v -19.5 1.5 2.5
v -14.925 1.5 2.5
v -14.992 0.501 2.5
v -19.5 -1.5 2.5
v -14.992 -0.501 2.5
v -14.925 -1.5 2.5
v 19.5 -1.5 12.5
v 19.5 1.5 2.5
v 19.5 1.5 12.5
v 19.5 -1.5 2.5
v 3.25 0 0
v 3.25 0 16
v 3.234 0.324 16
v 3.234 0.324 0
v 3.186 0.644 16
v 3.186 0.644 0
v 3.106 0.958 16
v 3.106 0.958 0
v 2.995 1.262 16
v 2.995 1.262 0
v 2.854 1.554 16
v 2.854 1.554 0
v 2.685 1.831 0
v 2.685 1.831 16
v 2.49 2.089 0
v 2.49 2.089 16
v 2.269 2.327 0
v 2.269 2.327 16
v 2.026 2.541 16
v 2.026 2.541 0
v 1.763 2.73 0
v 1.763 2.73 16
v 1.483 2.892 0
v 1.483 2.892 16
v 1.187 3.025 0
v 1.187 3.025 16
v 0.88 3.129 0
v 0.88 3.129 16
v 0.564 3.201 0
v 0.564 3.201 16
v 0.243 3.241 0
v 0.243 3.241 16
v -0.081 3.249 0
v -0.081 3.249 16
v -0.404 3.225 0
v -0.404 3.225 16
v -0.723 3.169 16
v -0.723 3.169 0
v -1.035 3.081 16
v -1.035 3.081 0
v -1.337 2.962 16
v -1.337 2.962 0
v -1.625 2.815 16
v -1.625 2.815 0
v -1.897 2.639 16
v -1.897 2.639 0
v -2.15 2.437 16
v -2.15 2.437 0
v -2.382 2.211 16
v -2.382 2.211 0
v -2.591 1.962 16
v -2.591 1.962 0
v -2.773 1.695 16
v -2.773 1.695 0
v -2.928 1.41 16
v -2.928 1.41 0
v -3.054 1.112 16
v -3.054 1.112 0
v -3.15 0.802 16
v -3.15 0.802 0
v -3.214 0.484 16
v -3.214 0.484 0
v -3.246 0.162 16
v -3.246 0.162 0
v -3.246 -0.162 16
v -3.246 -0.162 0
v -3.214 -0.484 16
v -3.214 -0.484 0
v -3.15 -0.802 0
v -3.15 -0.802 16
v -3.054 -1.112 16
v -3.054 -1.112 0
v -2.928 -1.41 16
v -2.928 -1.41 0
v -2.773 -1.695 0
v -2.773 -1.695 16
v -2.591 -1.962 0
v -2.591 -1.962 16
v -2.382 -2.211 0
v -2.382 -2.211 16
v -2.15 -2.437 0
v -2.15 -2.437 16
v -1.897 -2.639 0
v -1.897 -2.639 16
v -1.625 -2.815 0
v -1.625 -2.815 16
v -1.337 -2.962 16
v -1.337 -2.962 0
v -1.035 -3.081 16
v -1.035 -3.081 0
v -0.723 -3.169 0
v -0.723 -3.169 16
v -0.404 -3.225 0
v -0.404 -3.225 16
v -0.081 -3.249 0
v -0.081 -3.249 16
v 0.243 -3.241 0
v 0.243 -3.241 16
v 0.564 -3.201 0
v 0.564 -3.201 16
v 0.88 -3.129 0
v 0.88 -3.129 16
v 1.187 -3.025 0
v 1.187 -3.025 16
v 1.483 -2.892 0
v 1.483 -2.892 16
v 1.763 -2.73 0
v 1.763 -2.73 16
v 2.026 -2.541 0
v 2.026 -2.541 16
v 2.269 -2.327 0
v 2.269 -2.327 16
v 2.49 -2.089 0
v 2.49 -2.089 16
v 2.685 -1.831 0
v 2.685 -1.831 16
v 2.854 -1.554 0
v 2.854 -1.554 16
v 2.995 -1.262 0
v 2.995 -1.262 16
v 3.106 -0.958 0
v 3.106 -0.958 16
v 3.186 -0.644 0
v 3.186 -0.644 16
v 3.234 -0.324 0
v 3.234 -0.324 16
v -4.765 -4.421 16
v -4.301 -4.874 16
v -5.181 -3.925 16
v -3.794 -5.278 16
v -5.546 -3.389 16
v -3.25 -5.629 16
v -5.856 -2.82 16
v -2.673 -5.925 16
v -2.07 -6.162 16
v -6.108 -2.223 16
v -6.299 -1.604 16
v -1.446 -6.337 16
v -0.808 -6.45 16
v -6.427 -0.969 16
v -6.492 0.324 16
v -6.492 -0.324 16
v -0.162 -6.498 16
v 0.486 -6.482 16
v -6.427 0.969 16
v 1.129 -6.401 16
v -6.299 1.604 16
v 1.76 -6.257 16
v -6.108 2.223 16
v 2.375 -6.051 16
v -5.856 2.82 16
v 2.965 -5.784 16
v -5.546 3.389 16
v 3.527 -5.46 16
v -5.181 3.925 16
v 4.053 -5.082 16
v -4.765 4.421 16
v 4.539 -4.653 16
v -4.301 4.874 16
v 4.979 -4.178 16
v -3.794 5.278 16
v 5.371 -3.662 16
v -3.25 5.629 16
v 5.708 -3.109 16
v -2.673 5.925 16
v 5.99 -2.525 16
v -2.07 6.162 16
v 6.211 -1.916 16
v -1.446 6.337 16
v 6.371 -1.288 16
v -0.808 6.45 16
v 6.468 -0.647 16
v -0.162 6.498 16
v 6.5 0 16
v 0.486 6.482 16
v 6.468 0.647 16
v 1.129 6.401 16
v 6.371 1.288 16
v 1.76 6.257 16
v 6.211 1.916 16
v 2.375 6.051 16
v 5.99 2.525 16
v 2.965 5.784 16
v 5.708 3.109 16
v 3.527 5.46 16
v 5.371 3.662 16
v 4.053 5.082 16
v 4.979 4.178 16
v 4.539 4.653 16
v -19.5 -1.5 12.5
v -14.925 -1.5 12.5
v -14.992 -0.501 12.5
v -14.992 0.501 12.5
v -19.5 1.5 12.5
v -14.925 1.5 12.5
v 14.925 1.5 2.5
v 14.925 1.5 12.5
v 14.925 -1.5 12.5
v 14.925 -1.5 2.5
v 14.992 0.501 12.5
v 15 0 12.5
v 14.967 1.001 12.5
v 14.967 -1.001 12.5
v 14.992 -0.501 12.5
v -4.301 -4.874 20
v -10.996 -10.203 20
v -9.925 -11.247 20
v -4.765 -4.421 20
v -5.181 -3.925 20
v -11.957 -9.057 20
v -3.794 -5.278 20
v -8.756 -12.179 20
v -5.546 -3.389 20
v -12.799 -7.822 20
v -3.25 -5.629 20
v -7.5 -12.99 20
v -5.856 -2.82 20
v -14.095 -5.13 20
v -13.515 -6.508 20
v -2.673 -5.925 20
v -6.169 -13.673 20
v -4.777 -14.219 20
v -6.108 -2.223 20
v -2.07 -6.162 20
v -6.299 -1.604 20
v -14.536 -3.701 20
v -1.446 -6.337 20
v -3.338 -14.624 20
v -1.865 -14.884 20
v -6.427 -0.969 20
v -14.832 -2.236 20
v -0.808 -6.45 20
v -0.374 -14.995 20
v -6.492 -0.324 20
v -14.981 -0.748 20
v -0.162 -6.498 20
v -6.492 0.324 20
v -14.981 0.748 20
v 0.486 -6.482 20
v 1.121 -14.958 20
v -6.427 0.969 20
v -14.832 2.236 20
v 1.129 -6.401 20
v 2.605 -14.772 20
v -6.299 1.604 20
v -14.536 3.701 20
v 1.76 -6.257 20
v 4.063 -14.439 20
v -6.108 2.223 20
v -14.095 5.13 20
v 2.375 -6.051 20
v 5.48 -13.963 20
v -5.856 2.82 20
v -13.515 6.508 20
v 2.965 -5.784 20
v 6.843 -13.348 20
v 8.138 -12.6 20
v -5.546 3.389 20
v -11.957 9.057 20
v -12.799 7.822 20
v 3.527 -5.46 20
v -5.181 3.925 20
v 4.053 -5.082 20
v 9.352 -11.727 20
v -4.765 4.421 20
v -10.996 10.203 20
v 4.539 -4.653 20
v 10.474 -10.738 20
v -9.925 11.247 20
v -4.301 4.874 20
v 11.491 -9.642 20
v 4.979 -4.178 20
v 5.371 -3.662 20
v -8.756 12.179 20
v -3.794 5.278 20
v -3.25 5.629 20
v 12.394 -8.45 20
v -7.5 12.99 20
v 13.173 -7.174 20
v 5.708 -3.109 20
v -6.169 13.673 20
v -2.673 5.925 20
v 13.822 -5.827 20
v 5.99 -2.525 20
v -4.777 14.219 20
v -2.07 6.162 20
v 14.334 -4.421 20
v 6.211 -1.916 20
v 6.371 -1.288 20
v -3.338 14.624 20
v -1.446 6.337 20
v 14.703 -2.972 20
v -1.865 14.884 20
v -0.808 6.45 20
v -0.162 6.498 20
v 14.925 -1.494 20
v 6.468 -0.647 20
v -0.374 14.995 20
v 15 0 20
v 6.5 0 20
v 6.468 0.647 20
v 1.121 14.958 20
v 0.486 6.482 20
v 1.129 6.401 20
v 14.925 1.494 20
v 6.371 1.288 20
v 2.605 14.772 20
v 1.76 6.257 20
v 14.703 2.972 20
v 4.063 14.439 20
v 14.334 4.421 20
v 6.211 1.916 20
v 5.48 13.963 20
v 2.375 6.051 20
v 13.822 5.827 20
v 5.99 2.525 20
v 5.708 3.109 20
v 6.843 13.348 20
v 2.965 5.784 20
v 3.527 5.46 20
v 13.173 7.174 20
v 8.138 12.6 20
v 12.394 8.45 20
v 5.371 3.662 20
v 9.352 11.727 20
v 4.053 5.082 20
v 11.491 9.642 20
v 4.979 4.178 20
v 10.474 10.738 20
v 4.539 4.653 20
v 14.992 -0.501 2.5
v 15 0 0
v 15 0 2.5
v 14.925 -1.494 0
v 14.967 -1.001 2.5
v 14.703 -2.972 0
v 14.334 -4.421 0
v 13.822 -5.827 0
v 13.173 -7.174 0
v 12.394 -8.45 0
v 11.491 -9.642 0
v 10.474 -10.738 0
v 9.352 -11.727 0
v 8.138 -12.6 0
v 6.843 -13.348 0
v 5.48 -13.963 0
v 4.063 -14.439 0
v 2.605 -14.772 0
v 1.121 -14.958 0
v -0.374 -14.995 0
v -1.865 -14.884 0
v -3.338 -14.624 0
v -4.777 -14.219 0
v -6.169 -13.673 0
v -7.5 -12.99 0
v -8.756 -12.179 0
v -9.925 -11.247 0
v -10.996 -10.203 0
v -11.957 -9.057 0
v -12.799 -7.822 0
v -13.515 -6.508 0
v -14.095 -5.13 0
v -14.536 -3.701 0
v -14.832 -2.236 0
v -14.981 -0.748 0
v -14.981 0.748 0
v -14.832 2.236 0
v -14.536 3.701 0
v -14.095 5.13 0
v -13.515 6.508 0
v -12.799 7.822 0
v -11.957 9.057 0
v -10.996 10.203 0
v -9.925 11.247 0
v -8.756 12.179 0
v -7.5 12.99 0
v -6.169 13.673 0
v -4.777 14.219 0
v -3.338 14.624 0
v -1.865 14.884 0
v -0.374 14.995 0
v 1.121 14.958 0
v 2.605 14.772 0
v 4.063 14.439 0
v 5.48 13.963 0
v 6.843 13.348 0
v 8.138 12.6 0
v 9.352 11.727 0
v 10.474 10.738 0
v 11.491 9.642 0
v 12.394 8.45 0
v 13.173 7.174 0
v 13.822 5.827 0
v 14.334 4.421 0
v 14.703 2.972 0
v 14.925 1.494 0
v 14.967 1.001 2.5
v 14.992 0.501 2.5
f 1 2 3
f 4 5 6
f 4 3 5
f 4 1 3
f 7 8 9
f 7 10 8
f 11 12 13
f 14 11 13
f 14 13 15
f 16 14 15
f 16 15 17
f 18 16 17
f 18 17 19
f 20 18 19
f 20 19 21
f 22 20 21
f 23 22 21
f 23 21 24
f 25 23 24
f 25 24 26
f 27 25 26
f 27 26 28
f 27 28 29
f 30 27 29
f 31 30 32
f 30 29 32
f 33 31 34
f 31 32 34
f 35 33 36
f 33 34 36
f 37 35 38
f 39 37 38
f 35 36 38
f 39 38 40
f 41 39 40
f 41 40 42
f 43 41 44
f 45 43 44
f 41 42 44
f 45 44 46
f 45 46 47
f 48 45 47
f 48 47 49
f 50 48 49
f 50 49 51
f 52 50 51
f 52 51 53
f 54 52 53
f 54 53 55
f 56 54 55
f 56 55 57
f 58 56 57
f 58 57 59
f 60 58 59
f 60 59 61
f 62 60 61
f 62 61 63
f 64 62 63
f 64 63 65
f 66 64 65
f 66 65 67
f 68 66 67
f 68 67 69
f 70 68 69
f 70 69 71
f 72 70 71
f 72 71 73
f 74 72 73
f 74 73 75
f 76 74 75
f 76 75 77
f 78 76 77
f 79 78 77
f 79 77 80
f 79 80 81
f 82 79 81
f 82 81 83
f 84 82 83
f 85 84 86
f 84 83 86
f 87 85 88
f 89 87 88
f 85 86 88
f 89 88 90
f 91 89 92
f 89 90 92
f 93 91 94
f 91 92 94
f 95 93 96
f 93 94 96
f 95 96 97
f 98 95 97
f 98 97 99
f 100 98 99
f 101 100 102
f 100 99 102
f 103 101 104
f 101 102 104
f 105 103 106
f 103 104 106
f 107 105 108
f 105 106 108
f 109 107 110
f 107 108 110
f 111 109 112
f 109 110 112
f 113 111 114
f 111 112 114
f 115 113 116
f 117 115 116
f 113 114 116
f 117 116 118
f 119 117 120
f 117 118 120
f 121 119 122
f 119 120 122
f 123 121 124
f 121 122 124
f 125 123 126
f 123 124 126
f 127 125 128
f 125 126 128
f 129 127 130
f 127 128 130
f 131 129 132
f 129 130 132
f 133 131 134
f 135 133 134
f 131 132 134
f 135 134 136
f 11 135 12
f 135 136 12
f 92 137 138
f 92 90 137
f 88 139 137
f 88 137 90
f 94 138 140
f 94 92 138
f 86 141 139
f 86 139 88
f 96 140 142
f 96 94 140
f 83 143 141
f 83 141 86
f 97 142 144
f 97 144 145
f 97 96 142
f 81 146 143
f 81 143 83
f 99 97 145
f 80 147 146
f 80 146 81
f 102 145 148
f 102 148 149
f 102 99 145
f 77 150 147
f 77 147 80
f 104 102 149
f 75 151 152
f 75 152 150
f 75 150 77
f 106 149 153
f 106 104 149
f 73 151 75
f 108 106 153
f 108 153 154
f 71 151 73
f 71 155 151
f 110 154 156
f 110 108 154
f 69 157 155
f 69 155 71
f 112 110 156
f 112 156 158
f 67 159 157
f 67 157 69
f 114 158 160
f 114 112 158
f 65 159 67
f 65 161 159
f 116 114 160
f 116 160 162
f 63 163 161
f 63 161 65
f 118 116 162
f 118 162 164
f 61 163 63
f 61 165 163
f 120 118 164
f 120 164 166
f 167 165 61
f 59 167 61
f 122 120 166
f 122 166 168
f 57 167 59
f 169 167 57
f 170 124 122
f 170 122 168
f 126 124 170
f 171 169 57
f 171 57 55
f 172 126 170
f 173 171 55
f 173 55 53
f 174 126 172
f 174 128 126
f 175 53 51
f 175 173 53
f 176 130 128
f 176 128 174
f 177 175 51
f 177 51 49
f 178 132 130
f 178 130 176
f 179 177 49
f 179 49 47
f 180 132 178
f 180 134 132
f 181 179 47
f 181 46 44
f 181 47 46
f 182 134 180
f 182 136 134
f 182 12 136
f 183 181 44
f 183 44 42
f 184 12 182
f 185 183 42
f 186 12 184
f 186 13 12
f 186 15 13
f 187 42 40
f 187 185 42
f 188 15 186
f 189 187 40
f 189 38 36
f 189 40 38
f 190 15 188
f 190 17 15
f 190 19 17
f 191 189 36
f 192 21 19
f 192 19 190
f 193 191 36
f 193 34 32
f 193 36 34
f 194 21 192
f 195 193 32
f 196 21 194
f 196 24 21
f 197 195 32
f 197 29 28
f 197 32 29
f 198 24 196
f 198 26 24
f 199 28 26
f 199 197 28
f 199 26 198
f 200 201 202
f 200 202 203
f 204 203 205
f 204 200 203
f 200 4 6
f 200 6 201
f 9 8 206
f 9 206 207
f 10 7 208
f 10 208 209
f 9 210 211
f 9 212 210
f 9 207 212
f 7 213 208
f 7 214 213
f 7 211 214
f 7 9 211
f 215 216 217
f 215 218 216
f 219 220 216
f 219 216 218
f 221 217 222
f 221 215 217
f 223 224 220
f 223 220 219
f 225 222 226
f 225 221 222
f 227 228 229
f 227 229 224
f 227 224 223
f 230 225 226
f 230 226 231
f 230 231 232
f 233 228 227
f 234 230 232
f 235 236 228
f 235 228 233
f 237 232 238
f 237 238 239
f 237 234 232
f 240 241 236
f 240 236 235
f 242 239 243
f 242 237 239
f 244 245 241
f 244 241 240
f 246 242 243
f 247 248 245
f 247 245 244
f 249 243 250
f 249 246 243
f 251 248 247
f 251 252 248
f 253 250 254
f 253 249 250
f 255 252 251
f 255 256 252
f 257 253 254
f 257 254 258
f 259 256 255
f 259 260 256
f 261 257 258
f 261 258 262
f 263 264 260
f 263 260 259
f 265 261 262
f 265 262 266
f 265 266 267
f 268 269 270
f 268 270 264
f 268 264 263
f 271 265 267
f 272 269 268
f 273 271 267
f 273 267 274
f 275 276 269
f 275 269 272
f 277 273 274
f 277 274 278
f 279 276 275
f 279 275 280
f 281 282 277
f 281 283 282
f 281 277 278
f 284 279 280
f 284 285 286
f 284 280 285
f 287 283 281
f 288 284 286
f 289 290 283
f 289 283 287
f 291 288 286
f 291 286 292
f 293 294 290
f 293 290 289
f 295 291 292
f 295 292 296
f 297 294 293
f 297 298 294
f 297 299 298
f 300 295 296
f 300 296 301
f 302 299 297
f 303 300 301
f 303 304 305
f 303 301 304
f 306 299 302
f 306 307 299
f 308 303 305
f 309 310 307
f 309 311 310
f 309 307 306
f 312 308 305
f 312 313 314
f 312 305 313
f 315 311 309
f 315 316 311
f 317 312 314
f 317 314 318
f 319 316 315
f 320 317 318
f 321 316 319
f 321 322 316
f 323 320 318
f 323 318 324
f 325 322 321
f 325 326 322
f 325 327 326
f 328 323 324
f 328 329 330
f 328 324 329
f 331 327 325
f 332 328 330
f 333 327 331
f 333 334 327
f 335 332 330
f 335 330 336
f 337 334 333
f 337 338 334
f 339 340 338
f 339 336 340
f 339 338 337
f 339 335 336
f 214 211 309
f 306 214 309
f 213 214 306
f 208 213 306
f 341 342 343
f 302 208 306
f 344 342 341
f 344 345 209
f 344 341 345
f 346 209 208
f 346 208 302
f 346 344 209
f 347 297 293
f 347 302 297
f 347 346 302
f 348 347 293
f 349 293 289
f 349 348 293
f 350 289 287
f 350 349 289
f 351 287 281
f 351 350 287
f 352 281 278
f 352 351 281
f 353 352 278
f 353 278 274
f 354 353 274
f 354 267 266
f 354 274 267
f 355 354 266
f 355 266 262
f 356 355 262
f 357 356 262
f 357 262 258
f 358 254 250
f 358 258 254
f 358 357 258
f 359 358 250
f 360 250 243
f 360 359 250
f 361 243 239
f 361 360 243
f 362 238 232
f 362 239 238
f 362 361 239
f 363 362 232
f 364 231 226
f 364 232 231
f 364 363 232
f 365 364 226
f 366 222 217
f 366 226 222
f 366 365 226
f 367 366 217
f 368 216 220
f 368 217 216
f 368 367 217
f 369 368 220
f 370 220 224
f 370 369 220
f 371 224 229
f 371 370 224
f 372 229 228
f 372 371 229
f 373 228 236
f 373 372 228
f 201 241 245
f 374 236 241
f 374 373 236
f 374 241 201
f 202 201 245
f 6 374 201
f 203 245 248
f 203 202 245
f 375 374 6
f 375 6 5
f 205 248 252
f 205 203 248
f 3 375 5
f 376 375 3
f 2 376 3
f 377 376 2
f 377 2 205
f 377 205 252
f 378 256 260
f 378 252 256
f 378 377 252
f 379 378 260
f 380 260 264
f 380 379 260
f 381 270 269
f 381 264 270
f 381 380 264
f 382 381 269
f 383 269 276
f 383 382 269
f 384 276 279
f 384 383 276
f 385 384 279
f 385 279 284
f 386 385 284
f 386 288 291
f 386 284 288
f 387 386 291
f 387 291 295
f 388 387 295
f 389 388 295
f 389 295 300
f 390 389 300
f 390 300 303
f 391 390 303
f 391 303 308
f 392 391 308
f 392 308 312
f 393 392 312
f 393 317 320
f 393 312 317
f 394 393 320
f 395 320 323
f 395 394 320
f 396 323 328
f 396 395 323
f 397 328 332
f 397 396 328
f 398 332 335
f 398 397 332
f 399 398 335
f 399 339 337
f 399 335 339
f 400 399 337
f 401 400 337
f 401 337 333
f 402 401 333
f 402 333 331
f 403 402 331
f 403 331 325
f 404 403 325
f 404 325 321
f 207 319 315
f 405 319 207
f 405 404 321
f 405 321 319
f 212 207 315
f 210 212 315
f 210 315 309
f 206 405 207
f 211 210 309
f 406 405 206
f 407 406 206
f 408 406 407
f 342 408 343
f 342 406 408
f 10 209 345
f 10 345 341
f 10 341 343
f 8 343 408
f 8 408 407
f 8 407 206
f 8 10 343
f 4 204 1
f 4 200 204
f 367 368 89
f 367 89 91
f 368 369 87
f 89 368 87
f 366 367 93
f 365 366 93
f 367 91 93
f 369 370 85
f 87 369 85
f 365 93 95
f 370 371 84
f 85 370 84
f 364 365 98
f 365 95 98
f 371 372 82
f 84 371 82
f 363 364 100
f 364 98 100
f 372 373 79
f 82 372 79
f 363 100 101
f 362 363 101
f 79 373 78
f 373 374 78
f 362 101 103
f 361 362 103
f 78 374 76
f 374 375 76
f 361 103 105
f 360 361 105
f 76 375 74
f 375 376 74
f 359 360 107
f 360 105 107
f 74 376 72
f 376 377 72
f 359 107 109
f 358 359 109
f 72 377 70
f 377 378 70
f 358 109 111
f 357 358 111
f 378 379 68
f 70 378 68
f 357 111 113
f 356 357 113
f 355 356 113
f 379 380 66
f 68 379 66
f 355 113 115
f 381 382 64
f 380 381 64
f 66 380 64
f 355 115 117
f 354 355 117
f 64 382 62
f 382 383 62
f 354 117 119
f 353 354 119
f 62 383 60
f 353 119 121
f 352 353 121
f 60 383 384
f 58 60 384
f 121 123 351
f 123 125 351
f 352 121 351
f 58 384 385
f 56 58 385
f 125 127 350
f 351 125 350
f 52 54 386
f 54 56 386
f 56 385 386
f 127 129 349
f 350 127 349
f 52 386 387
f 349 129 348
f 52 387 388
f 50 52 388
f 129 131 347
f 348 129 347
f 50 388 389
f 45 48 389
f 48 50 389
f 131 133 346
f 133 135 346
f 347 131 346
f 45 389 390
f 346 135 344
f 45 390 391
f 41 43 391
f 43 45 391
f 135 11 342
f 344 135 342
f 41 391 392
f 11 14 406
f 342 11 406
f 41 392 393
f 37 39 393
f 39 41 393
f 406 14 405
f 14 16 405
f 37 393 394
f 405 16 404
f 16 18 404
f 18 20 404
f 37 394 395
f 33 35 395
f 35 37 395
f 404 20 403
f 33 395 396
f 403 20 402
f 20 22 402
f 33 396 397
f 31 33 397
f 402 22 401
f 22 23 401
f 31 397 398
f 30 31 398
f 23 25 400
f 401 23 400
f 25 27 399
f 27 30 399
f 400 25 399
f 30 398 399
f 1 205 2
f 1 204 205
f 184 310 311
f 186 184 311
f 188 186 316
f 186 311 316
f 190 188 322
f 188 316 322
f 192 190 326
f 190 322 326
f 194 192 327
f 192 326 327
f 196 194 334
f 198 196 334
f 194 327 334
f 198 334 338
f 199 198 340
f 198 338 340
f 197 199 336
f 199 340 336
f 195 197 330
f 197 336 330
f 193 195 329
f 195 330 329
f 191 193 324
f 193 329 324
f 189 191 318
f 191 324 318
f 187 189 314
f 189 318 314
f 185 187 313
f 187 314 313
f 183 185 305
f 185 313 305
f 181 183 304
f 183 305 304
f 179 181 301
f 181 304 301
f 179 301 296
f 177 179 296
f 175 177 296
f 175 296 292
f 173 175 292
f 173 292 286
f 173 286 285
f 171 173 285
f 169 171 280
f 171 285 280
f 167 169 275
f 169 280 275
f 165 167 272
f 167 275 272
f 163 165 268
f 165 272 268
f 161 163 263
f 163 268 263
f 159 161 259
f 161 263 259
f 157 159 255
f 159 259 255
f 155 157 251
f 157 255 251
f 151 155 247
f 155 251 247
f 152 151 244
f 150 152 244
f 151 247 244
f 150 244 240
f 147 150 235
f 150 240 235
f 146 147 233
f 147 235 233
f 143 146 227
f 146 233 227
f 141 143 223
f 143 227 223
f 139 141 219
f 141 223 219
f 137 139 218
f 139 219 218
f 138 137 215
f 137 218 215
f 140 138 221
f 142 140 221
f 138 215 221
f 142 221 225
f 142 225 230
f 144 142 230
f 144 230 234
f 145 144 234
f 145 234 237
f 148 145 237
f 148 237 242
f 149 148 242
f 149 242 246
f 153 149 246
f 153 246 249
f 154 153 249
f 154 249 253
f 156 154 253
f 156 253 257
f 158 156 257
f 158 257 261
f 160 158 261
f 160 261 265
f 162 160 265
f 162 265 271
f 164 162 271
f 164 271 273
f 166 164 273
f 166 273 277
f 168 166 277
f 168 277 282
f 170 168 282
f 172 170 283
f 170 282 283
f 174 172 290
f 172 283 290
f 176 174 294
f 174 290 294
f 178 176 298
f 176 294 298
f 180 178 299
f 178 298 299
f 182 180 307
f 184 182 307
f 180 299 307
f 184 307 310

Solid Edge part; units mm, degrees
sketch "Sketch1" plane through (0, 0, 0) normal (0, 0, 1) x (1, 0, 0)
  circle A0 centre (0, 0) radius 15
  dimension "D1" = 30
extrude "Protrusion1" add sketch "Sketch1" along normal blind 20
sketch "Sketch2" plane through (0, 0, 20) normal (0, 0, 1) x (1, 0, 0)
  circle A0 centre (0, 0) radius 3.25
  dimension "D1" = 6.5
extrude "Cutout1" cut sketch "Sketch2" against normal through all
sketch "Sketch3" plane through (19.5, 0, 0) normal (1, 0, 0) x (0, 1, 0)
  line L0 (-1.5, 2.5) -> (1.5, 2.5)
  line L1 (1.5, 2.5) -> (1.5, 12.5)
  line L2 (1.5, 12.5) -> (-1.5, 12.5)
  line L3 (-1.5, 12.5) -> (-1.5, 2.5)
  dimension "D1" = 3
  dimension "D2" = 10
  dimension "D3" = 7.5
extrude "Appoggio_laterale_Profile_Plane1" add sketch "Sketch3" against normal up to next
mirror "Mirror1" about plane through (0, 0, 0) normal (1, 0, 0) of "Appoggio_laterale_Profile_Plane1"
sketch "Sketch4" plane through (0, 0, 20) normal (0, 0, 1) x (1, 0, 0)
  circle A0 centre (0, 0) radius 6.5
  dimension "D1" = 13
extrude "ScavoEstrusione_2" cut sketch "Sketch4" against normal blind 4
